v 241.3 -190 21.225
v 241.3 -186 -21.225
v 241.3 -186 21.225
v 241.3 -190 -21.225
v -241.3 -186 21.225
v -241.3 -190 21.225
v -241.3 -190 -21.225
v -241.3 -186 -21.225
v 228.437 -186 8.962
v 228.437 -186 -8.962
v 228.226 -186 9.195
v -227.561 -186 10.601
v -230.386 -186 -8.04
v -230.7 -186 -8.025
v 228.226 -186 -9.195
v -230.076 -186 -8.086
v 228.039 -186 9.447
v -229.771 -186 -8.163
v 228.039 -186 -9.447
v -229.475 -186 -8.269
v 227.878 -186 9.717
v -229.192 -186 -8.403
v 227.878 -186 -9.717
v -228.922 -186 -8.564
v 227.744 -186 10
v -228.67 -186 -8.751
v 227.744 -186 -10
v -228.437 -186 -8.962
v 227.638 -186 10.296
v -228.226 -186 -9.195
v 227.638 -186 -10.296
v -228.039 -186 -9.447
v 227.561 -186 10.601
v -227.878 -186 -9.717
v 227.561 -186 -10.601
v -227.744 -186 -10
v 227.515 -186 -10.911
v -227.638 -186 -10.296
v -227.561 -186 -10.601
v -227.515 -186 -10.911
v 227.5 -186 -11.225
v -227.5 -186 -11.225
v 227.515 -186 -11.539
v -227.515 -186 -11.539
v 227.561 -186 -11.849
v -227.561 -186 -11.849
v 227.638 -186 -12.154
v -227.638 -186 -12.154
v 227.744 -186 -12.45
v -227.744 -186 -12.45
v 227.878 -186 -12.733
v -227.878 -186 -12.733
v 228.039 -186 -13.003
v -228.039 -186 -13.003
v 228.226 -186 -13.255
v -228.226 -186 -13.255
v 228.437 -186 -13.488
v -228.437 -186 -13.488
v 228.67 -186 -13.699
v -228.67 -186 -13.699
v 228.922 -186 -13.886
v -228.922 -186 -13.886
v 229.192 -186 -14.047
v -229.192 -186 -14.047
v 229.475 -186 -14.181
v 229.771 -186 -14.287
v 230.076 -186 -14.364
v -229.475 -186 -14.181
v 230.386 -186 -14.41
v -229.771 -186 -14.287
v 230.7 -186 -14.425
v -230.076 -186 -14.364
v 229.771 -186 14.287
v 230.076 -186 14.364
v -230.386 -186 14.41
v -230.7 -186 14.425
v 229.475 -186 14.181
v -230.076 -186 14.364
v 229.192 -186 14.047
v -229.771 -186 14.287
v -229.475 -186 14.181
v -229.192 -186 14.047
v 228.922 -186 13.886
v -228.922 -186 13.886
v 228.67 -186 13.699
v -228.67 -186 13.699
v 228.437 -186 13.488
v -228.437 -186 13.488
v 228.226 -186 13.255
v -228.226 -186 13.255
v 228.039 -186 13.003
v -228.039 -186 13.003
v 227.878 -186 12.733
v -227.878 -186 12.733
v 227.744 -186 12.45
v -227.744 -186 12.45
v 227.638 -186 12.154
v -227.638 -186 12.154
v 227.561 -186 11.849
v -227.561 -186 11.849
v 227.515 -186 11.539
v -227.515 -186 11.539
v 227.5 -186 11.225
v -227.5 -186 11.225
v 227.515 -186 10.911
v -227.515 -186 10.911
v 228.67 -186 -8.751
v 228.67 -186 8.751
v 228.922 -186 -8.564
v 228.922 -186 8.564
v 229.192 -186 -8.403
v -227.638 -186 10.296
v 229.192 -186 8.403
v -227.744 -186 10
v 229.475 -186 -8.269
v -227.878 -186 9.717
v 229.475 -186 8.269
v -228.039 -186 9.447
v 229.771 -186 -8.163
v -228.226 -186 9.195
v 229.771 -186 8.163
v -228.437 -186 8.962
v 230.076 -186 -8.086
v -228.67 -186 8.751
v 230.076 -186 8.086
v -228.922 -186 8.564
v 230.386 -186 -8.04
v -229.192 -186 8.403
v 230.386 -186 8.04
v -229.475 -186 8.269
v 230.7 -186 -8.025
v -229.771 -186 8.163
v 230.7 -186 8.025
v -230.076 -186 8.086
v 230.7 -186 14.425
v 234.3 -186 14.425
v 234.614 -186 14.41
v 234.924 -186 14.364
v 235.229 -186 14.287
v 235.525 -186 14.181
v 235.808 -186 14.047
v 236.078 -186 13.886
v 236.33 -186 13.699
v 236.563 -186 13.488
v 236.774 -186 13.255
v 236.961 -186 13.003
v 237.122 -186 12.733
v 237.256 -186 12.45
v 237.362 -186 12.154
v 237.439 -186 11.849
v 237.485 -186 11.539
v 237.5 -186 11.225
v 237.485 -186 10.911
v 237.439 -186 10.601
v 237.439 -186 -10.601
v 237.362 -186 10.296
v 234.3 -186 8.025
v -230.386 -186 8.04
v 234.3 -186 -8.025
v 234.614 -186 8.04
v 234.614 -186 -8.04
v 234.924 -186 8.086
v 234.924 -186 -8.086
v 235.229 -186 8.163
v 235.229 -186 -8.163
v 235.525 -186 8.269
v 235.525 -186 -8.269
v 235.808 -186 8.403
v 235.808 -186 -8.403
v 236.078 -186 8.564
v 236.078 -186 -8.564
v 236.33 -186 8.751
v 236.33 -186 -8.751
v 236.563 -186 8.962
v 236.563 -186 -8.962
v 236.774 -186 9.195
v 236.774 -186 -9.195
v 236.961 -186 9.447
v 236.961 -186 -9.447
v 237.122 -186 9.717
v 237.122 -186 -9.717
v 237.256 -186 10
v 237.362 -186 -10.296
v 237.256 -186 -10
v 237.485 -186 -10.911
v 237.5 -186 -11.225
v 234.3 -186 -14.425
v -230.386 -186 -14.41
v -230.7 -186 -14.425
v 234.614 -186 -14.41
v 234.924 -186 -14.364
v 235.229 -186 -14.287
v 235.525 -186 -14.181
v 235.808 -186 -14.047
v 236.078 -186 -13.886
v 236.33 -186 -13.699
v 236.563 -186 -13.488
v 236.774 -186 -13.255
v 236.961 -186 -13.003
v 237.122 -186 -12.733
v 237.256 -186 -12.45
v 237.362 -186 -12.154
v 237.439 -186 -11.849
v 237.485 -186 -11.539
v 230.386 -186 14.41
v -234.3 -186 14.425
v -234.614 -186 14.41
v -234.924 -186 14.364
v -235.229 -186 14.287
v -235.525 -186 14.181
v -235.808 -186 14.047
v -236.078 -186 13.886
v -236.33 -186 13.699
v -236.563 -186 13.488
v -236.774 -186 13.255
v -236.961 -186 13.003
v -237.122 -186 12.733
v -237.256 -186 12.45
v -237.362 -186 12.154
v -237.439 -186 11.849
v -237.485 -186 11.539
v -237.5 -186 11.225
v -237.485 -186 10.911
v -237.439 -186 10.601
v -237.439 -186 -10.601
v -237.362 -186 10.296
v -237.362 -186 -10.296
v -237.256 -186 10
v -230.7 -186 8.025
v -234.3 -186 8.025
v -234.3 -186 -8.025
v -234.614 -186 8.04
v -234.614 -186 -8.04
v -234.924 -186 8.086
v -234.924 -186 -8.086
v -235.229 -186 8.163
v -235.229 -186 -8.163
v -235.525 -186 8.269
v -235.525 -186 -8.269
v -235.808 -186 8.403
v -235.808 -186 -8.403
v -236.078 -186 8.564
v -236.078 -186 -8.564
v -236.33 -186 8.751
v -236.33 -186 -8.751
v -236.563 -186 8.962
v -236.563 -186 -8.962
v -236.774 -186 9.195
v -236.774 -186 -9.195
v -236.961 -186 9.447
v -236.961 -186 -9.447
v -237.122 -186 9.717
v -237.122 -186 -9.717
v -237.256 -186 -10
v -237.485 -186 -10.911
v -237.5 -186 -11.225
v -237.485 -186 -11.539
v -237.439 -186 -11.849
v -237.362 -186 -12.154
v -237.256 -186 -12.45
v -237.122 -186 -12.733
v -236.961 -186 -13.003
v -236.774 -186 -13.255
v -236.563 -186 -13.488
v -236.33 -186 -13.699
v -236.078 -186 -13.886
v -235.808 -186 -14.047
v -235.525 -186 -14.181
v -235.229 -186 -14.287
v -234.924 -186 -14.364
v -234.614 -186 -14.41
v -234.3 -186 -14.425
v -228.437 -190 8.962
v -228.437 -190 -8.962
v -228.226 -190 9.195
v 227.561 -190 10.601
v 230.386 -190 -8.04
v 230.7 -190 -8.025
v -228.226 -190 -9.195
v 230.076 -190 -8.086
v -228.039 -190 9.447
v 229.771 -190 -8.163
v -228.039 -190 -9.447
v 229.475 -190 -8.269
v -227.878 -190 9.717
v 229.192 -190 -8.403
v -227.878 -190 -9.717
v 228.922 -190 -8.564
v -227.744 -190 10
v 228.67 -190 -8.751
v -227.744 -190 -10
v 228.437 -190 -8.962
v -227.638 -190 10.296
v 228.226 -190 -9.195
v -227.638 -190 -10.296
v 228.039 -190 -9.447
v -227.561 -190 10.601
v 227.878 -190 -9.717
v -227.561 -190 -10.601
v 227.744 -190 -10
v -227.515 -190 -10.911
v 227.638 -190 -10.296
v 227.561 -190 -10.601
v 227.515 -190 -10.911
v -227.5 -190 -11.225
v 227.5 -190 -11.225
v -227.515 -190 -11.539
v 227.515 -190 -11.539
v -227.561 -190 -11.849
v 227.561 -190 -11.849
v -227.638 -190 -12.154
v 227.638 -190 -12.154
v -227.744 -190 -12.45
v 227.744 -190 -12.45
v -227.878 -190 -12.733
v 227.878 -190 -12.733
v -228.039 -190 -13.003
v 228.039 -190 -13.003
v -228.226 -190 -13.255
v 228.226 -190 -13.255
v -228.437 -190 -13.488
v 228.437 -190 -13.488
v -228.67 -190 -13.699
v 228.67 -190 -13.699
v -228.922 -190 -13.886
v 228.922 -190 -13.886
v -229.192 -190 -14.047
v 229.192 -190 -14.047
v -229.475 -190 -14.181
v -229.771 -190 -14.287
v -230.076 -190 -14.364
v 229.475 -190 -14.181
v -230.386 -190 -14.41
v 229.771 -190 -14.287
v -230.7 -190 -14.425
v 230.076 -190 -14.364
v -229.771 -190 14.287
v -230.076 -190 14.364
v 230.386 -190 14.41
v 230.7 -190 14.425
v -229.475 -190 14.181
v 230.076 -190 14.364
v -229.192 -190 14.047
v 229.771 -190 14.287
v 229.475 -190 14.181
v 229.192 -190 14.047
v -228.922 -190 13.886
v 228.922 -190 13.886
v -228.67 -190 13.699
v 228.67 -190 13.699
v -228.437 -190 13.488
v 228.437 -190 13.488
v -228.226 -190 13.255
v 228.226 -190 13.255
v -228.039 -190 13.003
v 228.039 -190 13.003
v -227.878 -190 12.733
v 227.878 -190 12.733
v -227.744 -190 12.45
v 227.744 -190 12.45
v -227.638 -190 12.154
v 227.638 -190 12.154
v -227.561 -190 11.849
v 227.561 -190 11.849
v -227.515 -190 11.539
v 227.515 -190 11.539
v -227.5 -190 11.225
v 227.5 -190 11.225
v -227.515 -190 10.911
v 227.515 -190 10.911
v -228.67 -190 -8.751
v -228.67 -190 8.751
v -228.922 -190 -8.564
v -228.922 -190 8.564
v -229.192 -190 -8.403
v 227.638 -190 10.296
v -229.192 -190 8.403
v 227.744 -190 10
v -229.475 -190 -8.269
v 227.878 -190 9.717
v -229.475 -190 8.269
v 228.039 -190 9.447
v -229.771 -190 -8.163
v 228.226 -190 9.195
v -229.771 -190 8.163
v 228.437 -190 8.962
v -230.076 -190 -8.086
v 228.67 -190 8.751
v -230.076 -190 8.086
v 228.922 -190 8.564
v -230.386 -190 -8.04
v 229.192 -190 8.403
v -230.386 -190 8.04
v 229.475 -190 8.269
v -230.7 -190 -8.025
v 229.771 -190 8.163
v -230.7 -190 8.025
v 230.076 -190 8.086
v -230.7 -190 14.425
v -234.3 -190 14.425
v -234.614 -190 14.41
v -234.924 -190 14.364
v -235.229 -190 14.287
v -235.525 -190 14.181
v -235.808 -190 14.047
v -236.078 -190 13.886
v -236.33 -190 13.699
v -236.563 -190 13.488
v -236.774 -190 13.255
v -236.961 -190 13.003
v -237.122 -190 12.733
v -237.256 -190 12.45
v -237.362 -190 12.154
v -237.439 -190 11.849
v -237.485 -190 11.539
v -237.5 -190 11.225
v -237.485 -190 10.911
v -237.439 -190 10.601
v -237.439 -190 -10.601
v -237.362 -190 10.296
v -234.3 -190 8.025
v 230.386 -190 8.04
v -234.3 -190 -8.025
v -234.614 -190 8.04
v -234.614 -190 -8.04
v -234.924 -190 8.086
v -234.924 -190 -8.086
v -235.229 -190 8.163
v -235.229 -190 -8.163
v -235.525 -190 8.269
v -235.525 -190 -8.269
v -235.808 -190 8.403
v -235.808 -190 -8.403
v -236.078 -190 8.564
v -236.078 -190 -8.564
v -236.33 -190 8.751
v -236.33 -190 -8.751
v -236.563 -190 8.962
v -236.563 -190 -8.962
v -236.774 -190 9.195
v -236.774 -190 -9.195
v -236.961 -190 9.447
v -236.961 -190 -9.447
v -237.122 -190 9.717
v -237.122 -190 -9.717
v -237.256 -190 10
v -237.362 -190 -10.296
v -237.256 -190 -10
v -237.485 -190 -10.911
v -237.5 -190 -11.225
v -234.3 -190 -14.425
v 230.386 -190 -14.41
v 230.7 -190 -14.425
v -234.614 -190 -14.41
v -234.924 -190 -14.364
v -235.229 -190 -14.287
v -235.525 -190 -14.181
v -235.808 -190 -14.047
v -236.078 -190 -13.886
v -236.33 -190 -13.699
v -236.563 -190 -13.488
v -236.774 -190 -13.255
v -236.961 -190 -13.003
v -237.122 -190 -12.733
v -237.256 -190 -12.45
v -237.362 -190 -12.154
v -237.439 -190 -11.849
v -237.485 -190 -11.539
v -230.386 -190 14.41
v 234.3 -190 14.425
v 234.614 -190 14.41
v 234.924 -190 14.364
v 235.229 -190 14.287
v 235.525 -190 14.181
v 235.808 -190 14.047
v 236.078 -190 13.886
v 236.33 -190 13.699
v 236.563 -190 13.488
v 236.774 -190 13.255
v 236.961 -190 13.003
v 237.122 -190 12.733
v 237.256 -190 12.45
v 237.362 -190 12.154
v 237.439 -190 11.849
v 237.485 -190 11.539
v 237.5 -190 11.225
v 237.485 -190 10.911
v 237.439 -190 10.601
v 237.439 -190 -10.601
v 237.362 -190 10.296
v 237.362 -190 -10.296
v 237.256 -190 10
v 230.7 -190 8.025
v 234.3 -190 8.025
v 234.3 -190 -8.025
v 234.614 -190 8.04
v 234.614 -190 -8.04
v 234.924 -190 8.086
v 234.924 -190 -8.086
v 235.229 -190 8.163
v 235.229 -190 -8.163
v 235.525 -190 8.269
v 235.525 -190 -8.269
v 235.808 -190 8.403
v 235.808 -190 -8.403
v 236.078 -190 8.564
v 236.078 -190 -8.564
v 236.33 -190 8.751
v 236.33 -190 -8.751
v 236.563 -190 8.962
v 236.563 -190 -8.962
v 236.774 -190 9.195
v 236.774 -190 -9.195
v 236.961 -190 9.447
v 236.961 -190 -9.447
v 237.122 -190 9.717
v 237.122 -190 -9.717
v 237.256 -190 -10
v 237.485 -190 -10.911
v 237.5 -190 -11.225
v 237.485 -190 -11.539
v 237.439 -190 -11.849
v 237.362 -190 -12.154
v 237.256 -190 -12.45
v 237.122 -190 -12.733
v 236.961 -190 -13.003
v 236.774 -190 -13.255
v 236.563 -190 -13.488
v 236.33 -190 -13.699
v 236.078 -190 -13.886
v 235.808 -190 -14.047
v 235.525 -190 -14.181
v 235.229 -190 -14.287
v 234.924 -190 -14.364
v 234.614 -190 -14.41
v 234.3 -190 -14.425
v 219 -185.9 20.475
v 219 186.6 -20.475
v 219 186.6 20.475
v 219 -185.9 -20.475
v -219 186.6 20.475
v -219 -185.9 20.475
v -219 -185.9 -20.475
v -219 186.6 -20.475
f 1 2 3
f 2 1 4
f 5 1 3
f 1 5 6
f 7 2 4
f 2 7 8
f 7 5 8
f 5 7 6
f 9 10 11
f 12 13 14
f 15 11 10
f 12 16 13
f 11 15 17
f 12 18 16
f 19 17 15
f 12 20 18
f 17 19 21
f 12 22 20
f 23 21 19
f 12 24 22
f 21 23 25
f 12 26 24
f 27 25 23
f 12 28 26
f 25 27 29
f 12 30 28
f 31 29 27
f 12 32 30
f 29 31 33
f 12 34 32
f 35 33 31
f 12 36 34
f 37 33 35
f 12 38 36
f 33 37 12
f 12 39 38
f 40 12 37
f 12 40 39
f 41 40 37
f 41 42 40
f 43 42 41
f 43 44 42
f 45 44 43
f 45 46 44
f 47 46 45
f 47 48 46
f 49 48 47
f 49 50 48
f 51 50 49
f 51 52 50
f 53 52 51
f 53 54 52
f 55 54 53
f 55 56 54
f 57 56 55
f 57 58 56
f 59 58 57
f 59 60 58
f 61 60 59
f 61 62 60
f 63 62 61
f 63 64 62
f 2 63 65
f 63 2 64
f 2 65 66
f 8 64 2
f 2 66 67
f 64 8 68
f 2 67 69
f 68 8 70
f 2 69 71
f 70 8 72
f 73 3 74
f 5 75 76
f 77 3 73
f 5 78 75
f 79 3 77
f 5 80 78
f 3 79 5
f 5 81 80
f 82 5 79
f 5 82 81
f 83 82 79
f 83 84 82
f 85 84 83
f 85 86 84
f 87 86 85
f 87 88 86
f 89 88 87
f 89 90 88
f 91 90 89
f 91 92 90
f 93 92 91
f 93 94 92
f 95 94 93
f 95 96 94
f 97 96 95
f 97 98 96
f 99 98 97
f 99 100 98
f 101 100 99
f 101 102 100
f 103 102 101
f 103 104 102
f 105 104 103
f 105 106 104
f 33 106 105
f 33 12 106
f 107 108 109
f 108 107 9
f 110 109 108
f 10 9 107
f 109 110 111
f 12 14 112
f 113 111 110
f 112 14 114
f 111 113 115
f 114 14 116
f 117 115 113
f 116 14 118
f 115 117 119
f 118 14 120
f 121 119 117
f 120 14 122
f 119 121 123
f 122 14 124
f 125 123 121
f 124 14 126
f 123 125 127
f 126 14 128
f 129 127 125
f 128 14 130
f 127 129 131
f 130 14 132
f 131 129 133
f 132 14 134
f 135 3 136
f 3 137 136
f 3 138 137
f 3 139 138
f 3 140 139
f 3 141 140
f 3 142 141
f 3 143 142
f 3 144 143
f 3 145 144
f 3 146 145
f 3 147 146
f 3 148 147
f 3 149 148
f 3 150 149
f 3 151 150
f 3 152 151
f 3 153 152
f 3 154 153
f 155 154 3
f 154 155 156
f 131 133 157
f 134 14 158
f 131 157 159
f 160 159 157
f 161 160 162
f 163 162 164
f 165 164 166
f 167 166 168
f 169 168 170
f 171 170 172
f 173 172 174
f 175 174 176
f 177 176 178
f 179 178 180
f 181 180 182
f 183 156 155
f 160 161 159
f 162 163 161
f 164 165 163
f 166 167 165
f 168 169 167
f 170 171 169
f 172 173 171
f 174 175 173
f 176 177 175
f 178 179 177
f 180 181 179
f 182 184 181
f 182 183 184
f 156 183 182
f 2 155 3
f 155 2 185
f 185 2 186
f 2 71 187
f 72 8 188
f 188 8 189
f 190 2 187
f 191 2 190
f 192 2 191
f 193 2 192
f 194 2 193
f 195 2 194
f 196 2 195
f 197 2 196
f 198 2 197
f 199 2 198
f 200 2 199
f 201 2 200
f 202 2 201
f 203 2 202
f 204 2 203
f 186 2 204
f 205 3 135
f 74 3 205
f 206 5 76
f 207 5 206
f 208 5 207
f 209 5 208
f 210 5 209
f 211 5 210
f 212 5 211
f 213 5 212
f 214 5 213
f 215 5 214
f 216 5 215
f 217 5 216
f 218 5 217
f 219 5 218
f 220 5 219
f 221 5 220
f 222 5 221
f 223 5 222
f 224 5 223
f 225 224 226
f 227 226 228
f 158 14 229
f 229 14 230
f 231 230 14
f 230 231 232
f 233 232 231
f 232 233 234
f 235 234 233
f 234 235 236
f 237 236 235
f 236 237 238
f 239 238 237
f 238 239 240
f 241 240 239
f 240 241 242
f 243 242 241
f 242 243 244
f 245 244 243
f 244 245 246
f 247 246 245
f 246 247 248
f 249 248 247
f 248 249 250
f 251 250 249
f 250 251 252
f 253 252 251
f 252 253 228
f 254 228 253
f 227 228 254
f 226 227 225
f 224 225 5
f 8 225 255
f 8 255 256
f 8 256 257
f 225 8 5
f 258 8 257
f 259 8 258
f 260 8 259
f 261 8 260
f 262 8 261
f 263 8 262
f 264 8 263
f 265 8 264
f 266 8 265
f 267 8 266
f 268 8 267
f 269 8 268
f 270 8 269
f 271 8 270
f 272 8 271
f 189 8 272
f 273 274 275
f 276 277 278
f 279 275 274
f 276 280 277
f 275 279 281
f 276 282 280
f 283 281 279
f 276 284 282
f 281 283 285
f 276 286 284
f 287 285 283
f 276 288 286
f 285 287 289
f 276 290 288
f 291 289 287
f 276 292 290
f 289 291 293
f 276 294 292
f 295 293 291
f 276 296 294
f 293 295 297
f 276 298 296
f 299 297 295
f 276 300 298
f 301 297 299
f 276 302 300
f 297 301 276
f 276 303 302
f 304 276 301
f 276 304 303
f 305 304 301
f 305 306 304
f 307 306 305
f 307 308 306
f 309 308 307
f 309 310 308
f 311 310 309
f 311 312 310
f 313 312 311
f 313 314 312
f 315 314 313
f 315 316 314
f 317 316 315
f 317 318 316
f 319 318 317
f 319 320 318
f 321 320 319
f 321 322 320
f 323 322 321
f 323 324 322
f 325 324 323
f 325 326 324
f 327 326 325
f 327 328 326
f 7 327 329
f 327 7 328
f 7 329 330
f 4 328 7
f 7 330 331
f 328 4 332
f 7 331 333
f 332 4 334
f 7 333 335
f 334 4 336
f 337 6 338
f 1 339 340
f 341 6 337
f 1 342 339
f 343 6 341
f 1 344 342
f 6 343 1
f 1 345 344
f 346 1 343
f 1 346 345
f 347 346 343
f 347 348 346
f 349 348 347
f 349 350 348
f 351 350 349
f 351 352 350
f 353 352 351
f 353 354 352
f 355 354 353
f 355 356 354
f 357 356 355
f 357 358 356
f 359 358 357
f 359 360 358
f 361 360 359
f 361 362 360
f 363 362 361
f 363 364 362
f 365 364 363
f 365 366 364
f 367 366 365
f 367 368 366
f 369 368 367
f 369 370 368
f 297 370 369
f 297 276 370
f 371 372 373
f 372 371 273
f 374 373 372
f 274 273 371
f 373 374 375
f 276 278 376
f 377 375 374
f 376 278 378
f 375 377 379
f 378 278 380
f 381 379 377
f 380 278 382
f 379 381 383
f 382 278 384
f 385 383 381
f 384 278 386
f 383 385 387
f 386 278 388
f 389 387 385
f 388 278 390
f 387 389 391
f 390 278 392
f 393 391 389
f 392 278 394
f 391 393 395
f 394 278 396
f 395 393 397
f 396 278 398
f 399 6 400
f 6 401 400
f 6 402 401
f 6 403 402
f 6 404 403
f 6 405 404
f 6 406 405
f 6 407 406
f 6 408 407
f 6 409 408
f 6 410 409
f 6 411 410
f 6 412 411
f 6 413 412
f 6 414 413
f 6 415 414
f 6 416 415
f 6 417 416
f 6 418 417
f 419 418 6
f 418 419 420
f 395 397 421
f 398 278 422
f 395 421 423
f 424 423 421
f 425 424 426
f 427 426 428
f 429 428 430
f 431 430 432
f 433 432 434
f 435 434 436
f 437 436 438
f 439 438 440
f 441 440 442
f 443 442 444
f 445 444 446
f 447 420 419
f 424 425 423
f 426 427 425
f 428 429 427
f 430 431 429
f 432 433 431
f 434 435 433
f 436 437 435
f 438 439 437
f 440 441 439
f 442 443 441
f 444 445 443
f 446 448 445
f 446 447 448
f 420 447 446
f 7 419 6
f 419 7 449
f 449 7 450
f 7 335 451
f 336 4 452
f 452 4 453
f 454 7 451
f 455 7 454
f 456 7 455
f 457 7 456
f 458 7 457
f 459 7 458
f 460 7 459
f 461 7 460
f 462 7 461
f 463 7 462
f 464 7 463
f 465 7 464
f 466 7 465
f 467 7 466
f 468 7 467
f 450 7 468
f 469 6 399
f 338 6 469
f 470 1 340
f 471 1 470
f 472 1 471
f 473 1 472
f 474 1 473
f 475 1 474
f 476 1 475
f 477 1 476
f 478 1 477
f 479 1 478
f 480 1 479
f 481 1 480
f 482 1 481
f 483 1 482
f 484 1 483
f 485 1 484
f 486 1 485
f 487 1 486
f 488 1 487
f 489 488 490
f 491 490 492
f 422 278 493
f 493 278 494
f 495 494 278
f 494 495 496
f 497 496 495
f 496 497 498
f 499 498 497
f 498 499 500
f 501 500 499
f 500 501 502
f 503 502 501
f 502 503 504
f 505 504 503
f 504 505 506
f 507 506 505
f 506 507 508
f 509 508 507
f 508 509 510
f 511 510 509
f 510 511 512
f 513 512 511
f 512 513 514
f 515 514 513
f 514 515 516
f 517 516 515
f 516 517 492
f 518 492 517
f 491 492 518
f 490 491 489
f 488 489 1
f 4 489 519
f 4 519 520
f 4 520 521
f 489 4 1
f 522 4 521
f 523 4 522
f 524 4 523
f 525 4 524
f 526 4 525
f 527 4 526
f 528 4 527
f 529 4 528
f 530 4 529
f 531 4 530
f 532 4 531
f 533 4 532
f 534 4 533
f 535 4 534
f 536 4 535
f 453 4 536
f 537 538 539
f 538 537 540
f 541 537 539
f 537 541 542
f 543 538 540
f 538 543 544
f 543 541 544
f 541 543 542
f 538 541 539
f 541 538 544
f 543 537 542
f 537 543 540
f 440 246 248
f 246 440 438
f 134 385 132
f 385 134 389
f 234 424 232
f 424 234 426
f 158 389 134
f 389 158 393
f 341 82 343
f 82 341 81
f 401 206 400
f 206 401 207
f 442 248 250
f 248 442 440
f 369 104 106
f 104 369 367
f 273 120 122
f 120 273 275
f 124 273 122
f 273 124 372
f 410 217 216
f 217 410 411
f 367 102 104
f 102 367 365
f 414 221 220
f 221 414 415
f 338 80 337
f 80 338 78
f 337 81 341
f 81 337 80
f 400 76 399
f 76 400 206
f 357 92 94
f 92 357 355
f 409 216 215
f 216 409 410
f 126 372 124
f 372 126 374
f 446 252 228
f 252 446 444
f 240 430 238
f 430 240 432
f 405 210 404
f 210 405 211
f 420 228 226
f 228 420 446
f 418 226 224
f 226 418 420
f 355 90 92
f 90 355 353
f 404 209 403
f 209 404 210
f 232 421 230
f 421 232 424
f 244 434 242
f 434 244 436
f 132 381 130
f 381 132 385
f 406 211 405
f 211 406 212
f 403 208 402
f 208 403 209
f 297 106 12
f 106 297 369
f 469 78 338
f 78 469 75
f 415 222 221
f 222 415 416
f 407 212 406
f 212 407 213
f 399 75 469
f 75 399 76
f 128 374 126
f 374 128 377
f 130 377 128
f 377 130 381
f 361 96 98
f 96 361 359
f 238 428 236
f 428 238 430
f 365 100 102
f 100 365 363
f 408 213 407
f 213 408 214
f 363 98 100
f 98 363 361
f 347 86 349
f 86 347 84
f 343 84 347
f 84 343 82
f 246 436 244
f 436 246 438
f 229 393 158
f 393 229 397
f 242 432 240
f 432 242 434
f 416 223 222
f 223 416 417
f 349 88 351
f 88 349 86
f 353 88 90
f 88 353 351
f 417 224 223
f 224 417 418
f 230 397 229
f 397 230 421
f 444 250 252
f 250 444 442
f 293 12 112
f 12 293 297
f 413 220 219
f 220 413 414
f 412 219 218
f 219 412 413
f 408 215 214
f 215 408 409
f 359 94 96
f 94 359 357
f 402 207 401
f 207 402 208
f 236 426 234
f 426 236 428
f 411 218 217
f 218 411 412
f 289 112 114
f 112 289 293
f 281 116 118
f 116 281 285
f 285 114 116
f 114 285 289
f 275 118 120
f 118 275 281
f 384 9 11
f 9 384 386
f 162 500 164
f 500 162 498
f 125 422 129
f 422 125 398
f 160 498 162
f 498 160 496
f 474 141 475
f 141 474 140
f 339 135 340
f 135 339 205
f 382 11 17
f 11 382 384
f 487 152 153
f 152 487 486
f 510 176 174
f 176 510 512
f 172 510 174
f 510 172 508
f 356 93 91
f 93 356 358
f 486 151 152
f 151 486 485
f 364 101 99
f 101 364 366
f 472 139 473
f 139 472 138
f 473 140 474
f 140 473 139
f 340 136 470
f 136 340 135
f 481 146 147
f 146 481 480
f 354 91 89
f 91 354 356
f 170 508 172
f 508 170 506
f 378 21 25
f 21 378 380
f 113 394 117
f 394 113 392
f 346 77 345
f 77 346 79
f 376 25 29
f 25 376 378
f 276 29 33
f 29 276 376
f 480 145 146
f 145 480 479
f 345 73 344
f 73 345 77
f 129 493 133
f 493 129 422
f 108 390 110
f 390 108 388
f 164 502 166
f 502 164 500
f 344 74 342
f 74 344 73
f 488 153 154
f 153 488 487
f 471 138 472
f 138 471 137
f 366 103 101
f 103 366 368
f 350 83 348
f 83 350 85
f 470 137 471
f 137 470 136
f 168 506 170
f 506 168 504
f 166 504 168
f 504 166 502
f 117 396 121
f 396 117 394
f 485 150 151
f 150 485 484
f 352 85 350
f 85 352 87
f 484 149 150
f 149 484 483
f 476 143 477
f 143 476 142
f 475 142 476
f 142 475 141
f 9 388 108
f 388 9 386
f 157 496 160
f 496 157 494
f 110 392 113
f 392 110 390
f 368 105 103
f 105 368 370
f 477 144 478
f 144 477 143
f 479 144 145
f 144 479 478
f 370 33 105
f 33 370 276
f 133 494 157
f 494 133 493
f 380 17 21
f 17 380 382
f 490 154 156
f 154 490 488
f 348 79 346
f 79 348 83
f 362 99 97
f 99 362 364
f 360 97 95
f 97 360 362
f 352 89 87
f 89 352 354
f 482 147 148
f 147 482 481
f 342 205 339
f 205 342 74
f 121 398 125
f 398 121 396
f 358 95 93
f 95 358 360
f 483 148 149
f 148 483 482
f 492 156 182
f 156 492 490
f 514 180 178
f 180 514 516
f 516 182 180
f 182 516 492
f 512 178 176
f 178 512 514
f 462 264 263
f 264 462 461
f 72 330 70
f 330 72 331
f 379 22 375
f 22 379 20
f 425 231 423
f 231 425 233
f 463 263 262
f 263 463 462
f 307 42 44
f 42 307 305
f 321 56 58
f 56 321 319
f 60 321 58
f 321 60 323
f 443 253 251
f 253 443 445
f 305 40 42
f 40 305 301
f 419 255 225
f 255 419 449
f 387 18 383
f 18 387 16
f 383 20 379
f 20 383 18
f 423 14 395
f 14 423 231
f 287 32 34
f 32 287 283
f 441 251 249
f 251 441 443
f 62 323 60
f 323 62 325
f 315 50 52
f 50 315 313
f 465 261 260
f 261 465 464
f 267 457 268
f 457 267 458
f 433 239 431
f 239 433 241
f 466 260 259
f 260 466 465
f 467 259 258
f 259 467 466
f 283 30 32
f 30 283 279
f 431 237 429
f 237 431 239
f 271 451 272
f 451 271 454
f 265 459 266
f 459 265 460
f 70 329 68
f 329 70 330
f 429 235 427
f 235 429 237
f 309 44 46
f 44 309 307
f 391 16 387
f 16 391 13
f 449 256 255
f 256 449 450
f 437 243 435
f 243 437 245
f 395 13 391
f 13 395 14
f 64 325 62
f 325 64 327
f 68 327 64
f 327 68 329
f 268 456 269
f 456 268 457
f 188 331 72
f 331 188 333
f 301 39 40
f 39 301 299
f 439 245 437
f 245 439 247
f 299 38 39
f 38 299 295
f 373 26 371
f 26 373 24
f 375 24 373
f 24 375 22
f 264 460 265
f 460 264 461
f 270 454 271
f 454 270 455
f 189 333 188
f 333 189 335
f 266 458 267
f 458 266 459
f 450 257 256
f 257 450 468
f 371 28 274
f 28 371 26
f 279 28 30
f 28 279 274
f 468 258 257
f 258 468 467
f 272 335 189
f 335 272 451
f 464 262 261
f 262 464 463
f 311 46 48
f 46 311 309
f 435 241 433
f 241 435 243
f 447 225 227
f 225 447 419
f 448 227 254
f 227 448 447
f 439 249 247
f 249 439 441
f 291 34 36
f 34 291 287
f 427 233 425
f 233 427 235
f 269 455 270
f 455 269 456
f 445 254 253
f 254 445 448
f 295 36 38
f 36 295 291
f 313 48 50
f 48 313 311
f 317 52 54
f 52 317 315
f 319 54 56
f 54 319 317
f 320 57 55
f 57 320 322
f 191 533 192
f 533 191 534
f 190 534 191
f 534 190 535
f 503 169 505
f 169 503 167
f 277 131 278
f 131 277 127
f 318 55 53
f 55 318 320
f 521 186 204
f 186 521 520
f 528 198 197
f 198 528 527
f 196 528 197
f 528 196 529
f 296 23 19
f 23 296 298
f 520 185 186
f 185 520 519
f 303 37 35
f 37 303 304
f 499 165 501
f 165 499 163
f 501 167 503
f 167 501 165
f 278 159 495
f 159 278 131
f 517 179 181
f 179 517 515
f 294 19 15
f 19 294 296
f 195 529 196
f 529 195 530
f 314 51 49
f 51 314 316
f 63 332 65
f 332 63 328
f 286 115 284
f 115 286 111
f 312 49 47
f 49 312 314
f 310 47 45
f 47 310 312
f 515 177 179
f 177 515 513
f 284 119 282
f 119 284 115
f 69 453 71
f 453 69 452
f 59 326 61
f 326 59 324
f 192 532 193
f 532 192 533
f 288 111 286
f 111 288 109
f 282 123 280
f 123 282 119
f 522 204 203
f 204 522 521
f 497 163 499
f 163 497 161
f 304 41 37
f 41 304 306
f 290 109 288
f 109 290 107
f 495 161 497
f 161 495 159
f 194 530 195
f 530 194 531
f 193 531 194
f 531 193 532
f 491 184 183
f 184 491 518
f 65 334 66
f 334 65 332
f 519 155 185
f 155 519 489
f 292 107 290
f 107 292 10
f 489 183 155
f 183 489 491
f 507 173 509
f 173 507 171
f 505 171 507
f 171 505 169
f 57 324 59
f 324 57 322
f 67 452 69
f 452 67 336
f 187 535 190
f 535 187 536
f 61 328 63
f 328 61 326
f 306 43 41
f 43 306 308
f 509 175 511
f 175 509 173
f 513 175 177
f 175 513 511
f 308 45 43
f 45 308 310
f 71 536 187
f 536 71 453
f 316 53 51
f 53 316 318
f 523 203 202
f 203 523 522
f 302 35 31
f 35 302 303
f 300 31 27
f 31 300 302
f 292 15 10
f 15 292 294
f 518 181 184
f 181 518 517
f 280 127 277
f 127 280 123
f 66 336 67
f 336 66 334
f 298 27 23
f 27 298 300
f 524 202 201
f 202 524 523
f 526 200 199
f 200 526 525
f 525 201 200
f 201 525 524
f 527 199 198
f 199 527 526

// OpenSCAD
// ============================================================================
// Atom Lithography Machine — Parametric OpenSCAD Module (S3.3-01)
// ============================================================================
// part_id           : S3.3-01
// parent_bom_id     : S3.3
// subsystem         : S3
// part_name         : Sayim kapisi FPGA islem karti (blanker_gate 100 MHz RTL)
// material          : Al 6061
// temp_stage        : 300 K (kabin)
// vacuum_grade      : Atmosfer
// tolerance         : ±10 ns
// computed_mass_kg  : 3.58361
// envelope_mm       : 482.600 x 413.000 x 42.450
// design_maturity   : M0_M1_DETAILED_CAD_DESIGN_ONLY
// no_lab_measurement: true
// iec61508_certified: false
// semi_s2_certified : false
// Units: millimeters (mm)
// ============================================================================

$fn = 64;

// Nominal bounding envelope parameters (mm)
bbox_x = 482.6000;
bbox_y = 413.0000;
bbox_z = 42.4500;

// Part-specific parametric dimensions
n_fpga_cards = 2;
rack_u_height = 1;
depth_mm = 380.0;

// Interface / port parameters (mm)

module part_S3_3_01() {
  difference() {
    union() {
      // 19-inch EIA-310 1U front faceplate (482.6 x 42.5 mm, facing -Y)
      translate([0.000, -188.000, 0.000]) cube([482.600, 4.000, 42.450], center=true);
      // Hollow EMI-shielded chassis body
      translate([0.000, 0.350, 0.000]) cube([438.000, 372.500, 40.950], center=true);
    }
    // EIA-310 upper-left rack ear slot
    translate([-232.500, -188.000, 11.225]) rotate([90.000, 0.000, 0.000]) {
      hull() {
        translate([-1.800, 0, 0]) cylinder(d=6.400, h=8.000, center=true);
        translate([1.800, 0, 0]) cylinder(d=6.400, h=8.000, center=true);
      }
    }
    // EIA-310 upper-right rack ear slot
    translate([232.500, -188.000, 11.225]) rotate([90.000, 0.000, 0.000]) {
      hull() {
        translate([-1.800, 0, 0]) cylinder(d=6.400, h=8.000, center=true);
        translate([1.800, 0, 0]) cylinder(d=6.400, h=8.000, center=true);
      }
    }
    // EIA-310 lower-left rack ear slot
    translate([-232.500, -188.000, -11.225]) rotate([90.000, 0.000, 0.000]) {
      hull() {
        translate([-1.800, 0, 0]) cylinder(d=6.400, h=8.000, center=true);
        translate([1.800, 0, 0]) cylinder(d=6.400, h=8.000, center=true);
      }
    }
    // EIA-310 lower-right rack ear slot
    translate([232.500, -188.000, -11.225]) rotate([90.000, 0.000, 0.000]) {
      hull() {
        translate([-1.800, 0, 0]) cylinder(d=6.400, h=8.000, center=true);
        translate([1.800, 0, 0]) cylinder(d=6.400, h=8.000, center=true);
      }
    }
  }
}

// World assembly mounting transform (global machine frame, mm / deg):
// translate([1480.000, -220.000, 634.575]) rotate([0.000, 0.000, 0.000]) part_S3_3_01();

part_S3_3_01();
